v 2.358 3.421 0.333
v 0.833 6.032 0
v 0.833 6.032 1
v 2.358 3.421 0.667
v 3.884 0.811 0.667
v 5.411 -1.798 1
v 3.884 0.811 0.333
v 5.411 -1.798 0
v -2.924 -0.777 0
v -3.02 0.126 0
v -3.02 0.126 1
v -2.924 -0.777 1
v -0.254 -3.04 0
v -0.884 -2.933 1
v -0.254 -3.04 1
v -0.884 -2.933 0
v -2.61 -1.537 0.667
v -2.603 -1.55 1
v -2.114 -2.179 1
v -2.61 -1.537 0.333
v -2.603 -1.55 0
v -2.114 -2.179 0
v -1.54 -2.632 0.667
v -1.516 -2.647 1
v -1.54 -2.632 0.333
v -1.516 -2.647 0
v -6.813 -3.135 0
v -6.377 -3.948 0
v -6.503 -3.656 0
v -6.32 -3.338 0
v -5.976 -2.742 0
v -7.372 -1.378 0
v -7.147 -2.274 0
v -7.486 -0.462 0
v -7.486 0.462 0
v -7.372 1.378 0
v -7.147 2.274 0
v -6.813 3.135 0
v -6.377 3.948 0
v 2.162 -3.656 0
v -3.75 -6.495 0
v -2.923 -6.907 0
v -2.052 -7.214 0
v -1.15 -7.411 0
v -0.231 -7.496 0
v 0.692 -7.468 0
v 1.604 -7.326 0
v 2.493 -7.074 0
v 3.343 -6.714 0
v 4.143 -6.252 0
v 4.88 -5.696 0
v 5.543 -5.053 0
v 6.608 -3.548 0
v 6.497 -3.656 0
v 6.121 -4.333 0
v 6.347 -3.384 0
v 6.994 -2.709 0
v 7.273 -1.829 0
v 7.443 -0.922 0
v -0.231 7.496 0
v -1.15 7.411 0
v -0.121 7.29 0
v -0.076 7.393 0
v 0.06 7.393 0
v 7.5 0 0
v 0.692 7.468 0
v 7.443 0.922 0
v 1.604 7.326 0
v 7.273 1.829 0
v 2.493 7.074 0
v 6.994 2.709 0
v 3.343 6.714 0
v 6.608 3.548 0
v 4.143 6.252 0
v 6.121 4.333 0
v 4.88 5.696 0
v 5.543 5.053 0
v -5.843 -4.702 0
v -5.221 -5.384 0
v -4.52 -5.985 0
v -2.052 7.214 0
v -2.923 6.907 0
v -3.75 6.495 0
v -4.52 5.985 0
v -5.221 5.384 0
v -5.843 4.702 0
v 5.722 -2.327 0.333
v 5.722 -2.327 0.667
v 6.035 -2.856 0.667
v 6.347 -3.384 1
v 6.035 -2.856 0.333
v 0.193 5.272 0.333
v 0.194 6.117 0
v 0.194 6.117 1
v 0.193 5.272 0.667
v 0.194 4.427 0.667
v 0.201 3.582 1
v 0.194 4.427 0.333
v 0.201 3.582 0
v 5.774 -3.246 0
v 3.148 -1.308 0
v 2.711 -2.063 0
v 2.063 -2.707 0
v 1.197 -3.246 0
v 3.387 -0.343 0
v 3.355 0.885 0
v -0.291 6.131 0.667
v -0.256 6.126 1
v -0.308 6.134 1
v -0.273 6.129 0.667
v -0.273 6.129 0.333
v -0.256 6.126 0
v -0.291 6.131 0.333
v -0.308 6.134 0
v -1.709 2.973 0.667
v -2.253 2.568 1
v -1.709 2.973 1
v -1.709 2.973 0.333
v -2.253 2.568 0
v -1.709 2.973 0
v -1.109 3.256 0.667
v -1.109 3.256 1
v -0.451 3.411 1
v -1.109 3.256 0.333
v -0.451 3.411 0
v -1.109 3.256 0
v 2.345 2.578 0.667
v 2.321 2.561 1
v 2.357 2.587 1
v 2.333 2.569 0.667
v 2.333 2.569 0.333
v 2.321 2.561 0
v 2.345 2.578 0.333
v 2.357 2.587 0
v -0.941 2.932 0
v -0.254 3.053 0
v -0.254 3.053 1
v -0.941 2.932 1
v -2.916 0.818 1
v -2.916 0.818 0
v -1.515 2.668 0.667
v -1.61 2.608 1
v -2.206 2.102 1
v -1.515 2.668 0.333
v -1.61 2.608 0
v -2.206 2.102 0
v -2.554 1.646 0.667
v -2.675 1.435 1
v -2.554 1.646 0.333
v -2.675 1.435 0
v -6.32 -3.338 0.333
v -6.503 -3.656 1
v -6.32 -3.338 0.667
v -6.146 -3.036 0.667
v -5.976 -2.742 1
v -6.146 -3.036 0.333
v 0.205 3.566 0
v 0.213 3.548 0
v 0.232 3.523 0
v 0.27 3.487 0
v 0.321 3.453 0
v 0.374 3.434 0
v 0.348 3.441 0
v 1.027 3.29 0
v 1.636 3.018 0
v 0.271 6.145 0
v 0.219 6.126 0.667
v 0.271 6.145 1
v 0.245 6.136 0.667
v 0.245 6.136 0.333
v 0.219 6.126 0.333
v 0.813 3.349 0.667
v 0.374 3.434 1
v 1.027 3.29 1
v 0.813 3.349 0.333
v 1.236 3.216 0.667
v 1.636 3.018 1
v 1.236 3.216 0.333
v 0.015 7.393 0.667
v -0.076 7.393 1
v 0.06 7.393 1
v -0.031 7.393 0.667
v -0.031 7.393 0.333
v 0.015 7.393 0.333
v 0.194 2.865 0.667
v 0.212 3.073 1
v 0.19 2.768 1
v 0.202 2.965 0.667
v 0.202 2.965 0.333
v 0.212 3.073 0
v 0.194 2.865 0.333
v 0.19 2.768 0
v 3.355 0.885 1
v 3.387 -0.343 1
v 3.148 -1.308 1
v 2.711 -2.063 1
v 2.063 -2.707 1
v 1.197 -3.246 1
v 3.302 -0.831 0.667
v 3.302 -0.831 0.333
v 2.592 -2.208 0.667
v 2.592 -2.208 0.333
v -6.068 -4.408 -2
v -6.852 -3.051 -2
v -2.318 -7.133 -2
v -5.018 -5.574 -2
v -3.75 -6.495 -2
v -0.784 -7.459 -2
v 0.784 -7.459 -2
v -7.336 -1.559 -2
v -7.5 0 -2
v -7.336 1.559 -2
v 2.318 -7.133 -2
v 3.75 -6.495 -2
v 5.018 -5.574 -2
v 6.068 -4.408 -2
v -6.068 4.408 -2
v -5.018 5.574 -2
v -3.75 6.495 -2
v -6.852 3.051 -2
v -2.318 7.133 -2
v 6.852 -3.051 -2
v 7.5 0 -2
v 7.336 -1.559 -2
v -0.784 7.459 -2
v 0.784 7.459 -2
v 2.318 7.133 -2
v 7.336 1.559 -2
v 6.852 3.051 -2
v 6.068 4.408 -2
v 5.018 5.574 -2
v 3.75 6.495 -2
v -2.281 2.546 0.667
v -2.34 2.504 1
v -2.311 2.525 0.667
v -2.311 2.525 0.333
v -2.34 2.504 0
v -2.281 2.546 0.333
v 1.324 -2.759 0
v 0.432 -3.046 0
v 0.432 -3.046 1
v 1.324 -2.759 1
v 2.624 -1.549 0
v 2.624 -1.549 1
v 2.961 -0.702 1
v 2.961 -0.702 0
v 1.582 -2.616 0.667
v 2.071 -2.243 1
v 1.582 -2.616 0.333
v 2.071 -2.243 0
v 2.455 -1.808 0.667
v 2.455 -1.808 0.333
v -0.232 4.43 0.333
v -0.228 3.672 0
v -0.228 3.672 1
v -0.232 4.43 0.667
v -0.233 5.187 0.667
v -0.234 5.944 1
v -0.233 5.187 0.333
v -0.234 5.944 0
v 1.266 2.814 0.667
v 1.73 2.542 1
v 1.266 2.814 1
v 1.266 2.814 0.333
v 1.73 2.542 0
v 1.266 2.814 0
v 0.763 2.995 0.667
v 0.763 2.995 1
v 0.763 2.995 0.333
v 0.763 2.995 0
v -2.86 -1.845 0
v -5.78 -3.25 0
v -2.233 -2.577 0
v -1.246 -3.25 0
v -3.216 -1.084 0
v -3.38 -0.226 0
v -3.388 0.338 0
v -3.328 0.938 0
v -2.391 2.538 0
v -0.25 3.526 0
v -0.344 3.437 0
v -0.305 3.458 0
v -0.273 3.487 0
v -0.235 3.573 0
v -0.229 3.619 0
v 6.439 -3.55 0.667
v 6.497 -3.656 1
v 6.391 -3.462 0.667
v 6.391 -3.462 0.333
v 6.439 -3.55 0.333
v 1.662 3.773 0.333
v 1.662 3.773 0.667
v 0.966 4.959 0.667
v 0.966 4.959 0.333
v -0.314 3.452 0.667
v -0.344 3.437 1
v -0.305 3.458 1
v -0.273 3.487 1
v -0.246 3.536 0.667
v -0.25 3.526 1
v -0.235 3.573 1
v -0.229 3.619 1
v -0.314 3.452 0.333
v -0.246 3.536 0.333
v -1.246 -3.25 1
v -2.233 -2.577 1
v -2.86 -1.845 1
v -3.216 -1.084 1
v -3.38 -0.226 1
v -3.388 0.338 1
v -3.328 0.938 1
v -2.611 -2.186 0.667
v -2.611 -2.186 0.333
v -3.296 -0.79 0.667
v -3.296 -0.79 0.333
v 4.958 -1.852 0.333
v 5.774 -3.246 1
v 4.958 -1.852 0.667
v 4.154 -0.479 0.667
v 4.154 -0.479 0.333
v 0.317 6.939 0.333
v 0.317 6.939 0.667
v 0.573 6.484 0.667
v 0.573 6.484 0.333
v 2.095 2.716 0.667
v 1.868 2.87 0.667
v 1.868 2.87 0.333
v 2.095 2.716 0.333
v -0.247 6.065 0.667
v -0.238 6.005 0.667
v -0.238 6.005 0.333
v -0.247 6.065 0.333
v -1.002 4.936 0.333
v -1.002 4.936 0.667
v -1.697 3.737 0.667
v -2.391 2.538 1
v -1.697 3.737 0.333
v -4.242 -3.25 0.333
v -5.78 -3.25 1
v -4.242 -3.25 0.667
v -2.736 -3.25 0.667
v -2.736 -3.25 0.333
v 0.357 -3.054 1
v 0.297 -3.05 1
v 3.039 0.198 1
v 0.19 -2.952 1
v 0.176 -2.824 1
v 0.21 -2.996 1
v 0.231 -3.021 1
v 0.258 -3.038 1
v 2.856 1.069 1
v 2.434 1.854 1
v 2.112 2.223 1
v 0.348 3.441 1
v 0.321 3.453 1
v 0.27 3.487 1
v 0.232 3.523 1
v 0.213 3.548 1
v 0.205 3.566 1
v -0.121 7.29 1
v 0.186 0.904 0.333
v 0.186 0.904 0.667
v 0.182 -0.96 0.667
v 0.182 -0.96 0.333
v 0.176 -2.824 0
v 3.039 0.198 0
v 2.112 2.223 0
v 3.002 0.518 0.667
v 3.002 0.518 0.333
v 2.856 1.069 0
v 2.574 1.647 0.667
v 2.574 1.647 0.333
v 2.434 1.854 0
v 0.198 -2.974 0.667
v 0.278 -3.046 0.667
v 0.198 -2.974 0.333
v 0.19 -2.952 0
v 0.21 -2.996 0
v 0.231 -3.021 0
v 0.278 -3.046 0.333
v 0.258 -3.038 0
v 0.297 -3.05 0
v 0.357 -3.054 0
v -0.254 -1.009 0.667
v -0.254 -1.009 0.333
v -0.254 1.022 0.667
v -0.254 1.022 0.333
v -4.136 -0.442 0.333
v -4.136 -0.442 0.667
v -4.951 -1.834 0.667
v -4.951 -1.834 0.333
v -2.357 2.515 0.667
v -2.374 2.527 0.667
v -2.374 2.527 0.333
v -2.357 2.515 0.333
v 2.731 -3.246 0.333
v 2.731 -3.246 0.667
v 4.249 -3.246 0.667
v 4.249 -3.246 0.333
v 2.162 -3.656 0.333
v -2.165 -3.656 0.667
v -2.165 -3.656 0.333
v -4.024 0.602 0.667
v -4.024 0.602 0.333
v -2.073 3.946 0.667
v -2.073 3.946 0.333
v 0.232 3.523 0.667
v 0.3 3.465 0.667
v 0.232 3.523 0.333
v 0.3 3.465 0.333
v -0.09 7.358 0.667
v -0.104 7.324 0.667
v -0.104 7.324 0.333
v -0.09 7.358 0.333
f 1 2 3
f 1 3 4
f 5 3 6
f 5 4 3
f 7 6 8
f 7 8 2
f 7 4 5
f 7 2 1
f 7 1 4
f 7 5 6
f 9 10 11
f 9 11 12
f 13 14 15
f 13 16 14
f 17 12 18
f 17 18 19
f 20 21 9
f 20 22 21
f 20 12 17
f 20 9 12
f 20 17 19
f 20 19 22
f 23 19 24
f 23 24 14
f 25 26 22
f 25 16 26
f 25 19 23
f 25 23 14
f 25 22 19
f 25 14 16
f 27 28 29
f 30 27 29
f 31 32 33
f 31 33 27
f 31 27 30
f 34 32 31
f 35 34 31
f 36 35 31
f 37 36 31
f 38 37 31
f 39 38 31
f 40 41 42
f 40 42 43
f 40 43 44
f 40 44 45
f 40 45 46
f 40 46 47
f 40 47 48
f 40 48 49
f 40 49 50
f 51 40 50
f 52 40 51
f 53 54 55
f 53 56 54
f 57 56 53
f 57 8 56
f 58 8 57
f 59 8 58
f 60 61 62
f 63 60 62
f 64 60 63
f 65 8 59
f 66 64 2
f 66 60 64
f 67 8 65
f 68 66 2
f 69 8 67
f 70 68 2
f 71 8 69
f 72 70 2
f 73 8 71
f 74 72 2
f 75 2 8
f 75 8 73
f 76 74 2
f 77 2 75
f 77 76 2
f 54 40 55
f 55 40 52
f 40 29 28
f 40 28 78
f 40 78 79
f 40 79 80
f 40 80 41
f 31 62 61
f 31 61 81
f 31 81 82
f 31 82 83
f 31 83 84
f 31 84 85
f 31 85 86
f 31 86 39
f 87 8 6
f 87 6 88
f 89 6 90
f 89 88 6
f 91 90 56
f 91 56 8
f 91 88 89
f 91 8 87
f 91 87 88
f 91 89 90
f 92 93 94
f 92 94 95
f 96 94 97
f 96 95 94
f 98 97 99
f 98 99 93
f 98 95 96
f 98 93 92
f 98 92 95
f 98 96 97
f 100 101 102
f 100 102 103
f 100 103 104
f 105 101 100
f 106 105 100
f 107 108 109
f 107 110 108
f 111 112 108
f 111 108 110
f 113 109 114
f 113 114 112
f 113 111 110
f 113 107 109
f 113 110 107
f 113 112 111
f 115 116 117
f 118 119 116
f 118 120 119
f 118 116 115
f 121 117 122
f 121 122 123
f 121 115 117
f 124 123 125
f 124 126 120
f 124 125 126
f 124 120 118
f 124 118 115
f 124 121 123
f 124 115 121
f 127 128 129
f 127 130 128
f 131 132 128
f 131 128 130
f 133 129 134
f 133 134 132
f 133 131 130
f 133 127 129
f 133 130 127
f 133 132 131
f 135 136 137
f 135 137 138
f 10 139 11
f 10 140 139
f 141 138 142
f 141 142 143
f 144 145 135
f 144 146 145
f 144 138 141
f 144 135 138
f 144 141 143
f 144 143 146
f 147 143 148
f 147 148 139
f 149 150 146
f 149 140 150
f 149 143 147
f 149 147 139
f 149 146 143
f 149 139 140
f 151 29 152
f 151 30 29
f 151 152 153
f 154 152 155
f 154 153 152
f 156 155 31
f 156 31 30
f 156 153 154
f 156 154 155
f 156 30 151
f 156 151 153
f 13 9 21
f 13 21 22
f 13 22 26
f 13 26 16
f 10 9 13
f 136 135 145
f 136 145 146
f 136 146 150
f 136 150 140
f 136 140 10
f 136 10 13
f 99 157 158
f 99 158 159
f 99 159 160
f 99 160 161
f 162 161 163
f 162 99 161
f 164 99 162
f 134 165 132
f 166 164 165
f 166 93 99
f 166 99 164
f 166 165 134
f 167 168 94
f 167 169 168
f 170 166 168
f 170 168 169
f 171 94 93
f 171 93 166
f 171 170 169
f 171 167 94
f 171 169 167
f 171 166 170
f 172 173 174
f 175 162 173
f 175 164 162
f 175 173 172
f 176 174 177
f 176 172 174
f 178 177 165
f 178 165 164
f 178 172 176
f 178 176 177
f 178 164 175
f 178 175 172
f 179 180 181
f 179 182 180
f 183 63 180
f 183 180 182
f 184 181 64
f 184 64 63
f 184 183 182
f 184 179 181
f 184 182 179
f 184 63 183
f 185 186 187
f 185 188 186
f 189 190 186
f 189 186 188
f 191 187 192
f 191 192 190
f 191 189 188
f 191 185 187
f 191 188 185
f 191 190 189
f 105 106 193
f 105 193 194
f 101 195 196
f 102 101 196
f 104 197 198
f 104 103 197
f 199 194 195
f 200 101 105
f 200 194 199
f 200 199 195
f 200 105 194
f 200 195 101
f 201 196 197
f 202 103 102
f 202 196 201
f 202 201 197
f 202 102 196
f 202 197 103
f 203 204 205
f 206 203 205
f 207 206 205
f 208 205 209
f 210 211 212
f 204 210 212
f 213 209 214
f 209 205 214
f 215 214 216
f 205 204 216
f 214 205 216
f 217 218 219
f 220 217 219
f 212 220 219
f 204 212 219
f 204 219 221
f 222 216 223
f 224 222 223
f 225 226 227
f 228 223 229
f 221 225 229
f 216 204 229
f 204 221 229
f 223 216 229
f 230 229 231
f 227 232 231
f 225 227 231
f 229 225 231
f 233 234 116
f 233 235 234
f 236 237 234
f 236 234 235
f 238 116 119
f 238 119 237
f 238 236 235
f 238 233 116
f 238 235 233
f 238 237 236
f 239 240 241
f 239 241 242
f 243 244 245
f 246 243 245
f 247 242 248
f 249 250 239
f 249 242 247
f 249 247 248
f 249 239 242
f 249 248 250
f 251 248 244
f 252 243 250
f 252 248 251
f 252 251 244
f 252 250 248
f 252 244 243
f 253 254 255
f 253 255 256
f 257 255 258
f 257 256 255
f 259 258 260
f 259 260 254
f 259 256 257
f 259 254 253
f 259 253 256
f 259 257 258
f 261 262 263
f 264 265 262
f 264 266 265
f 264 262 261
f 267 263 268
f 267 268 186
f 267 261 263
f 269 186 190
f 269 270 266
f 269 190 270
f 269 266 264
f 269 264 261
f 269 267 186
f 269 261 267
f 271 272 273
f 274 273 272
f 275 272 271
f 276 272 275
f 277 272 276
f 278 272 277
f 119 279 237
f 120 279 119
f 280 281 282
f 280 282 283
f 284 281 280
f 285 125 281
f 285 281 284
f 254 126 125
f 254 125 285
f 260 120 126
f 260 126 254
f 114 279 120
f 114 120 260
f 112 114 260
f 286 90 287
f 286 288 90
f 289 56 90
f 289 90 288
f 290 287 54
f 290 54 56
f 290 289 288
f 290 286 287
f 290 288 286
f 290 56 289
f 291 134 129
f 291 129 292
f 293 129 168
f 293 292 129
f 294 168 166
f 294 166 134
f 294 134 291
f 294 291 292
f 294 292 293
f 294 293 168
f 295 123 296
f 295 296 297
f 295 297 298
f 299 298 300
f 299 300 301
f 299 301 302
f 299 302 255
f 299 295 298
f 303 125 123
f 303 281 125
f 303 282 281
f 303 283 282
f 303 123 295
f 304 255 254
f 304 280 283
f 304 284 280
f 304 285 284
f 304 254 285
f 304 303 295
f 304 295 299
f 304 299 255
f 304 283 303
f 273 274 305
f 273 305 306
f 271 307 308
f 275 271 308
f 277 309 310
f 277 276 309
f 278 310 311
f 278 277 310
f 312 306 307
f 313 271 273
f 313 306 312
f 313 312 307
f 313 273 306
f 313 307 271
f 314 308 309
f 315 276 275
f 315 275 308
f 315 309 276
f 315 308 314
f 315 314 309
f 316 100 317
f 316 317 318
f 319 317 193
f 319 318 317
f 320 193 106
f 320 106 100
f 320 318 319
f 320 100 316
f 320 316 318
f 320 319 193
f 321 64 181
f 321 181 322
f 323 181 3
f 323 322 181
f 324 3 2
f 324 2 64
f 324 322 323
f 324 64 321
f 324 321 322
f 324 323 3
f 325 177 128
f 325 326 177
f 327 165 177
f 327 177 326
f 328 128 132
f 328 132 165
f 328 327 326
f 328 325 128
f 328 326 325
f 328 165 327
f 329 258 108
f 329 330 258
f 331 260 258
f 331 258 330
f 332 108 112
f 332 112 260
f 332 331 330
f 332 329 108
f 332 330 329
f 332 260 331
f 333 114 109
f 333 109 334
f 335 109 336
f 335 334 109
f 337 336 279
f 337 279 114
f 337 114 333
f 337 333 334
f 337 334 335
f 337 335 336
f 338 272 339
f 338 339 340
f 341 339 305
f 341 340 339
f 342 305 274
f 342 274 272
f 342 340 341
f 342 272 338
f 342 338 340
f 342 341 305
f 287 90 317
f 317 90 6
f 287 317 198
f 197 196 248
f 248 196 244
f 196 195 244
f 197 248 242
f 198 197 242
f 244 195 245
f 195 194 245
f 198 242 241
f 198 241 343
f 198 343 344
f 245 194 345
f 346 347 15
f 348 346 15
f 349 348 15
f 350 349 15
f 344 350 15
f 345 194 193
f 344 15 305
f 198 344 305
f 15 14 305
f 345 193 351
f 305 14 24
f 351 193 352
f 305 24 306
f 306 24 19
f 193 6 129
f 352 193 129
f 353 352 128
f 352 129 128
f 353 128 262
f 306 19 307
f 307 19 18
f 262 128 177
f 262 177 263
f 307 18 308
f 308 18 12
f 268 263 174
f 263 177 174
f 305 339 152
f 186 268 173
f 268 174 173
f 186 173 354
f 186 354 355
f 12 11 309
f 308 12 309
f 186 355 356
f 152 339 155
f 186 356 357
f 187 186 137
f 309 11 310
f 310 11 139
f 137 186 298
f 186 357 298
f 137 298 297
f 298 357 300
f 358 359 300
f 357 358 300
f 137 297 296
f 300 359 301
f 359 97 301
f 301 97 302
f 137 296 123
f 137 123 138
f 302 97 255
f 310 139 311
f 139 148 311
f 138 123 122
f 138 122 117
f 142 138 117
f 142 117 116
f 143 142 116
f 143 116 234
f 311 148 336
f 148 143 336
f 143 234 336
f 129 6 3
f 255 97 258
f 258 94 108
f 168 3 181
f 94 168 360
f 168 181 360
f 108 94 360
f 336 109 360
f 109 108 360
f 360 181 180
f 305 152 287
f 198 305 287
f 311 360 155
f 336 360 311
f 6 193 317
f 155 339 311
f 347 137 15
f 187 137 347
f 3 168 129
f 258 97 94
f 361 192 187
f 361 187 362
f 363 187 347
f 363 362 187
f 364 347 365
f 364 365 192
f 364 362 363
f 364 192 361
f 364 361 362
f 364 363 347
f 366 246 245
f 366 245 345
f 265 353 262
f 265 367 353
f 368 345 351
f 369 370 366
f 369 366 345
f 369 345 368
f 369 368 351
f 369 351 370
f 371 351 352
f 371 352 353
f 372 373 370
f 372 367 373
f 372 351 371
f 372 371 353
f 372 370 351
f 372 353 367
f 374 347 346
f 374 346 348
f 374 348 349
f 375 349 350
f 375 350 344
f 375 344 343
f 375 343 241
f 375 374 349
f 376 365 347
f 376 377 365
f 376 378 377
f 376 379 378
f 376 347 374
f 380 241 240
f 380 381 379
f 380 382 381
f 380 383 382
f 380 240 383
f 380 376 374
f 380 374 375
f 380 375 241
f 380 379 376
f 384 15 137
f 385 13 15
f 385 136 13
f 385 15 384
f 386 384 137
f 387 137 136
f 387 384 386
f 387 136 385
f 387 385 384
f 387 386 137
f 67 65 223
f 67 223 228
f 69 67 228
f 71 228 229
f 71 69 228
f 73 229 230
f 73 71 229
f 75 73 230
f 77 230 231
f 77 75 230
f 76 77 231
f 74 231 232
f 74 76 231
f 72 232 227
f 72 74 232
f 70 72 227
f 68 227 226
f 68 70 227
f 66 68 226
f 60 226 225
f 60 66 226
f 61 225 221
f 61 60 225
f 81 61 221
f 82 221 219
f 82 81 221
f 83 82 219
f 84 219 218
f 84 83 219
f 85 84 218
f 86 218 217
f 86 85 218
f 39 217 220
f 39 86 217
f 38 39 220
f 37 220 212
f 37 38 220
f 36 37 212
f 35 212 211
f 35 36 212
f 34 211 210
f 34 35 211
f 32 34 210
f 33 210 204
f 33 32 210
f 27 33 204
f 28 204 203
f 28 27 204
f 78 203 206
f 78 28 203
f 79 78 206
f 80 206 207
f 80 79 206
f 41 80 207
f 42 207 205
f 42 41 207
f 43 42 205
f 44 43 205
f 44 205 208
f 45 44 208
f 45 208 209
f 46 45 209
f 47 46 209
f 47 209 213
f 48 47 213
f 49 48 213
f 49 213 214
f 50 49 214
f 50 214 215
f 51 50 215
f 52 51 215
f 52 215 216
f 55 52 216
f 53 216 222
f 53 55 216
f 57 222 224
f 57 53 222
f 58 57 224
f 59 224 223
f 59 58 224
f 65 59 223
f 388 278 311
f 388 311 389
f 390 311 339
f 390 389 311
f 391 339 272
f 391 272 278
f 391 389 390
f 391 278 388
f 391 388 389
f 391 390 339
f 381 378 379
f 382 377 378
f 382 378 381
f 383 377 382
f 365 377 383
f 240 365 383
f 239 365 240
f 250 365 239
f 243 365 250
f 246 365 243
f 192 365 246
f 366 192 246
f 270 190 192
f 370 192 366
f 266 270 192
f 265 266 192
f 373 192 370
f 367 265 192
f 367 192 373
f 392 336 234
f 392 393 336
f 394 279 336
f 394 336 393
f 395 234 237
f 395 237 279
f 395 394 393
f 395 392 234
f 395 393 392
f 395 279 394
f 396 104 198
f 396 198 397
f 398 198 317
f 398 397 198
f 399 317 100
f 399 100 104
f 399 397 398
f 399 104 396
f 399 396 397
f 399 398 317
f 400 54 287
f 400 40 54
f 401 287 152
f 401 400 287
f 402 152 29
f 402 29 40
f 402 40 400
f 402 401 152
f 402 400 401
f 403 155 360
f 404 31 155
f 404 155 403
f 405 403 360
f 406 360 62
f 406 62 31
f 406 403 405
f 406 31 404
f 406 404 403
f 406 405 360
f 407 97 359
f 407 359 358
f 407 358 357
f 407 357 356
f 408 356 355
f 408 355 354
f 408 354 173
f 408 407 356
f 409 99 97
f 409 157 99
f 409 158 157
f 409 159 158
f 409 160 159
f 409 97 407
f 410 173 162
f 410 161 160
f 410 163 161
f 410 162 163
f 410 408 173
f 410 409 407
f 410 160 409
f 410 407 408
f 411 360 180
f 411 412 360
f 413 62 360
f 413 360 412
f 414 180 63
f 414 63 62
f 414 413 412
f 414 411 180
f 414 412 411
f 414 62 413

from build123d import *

# Parameters (mm, degrees)
F0_R     = 7.5
F2_DEPTH = 2
F3_DEPTH = 1


with BuildPart() as f2:
    # F0 (on Top) → F2 (new body)
    with BuildSketch(Plane.XY):
        Circle(F0_R)
    extrude(amount=-F2_DEPTH)

    # F1 (on Top) → F3 (join)
    with BuildSketch(Plane.XY):
        with BuildLine():
            add(Edge.make_bspline(
                [(0.0604885835, 7.3933677407), (0.3177365835, 6.9391977407), (0.5701195835, 6.4822377407), (0.8330605835, 6.0315707407)],
                knots=[0, 0, 0, 0, 1, 1, 1, 1], degree=3))
            add(Edge.make_bspline(
                [(-0.0762024165, 7.3933677407), (-0.0304464165, 7.3933677407), (0.0150095835, 7.3933677407), (0.0604885835, 7.3933677407)],
                knots=[0, 0, 0, 0, 1, 1, 1, 1], degree=3))
            add(Edge.make_bspline(
                [(-0.1212204165, 7.2902617407), (-0.1024804165, 7.3224177407), (-0.0909554165, 7.3588837407), (-0.0762024165, 7.3933677407)],
                knots=[0, 0, 0, 0, 1, 1, 1, 1], degree=3))
            add(Edge.make_bspline(
                [(-5.9762144165, -2.7421532593), (-4.0245564165, 0.6020177407), (-2.0726114165, 3.9459087407), (-0.1212204165, 7.2902617407)],
                knots=[0, 0, 0, 0, 1, 1, 1, 1], degree=3))
            add(Edge.make_bspline(
                [(-6.5031424165, -3.6556322593), (-6.3136034165, -3.3269782593), (-6.1463944165, -3.0337092593), (-5.9762144165, -2.7421532593)],
                knots=[0, 0, 0, 0, 1, 1, 1, 1], degree=3))
            add(Edge.make_bspline(
                [(6.4969945835, -3.6556322593), (2.1508305835, -3.6556322593), (-2.1525754165, -3.6556322593), (-6.5031424165, -3.6556322593)],
                knots=[0, 0, 0, 0, 1, 1, 1, 1], degree=3))
            add(Edge.make_bspline(
                [(6.3467955835, -3.3839732593), (6.3915375835, -3.4597902593), (6.4323375835, -3.5381272593), (6.4969945835, -3.6556322593)],
                knots=[0, 0, 0, 0, 1, 1, 1, 1], degree=3))
            add(Edge.make_bspline(
                [(5.4107935835, -1.7983302593), (5.7208275835, -2.3279572593), (6.0352405835, -2.8551552593), (6.3467955835, -3.3839732593)],
                knots=[0, 0, 0, 0, 1, 1, 1, 1], degree=3))
            add(Edge.make_bspline(
                [(0.8330605835, 6.0315707407), (2.3574805835, 3.4207877407), (3.8841375835, 0.8110887407), (5.4107935835, -1.7983302593)],
                knots=[0, 0, 0, 0, 1, 1, 1, 1], degree=3))
        make_face()
        with BuildLine():
            add(Edge.make_bspline(
                [(-5.7796534165, -3.2501722593), (-4.2207504165, -3.2501722593), (-2.7330644165, -3.2501722593), (-1.2455714165, -3.2501722593)],
                knots=[0, 0, 0, 0, 1, 1, 1, 1], degree=3))
            add(Edge.make_bspline(
                [(-3.3280754165, 0.9378677407), (-4.1345774165, -0.4399492593), (-4.9410894165, -1.8178682593), (-5.7796534165, -3.2501722593)],
                knots=[0, 0, 0, 0, 1, 1, 1, 1], degree=3))
            add(Edge.make_bspline(
                [(-1.2455714165, -3.2501722593), (-2.9605984165, -2.3525382593), (-3.6127754165, -0.9545362593), (-3.3280754165, 0.9378677407)],
                knots=[0, 0, 0, 0, 1, 1, 1, 1], degree=3))
        make_face(mode=Mode.SUBTRACT)
        with BuildLine():
            add(Edge.make_bspline(
                [(-0.2542014165, 3.0525277407), (-1.5089494165, 3.0320817407), (-2.9568184165, 1.8495517407), (-3.0198624165, 0.1261557407)],
                knots=[0, 0, 0, 0, 1, 1, 1, 1], degree=3))
            add(Edge.make_bspline(
                [(-0.2542014165, -3.0399232593), (-0.2542014165, -1.0090972593), (-0.2542014165, 1.0216117407), (-0.2542014165, 3.0525277407)],
                knots=[0, 0, 0, 0, 1, 1, 1, 1], degree=3))
            add(Edge.make_bspline(
                [(-3.0198624165, 0.1261557407), (-3.0896374165, -1.7814012593), (-1.4984154165, -3.0158812593), (-0.2542014165, -3.0399232593)],
                knots=[0, 0, 0, 0, 1, 1, 1, 1], degree=3))
        make_face(mode=Mode.SUBTRACT)
        with BuildLine():
            add(Edge.make_bspline(
                [(3.3546825835, 0.8849197407), (3.6216575835, -1.0009142593), (2.9443555835, -2.3765812593), (1.1968255835, -3.2457582593)],
                knots=[0, 0, 0, 0, 1, 1, 1, 1], degree=3))
            add(Edge.make_bspline(
                [(5.7743975835, -3.2457582593), (4.9505145835, -1.8388482593), (4.1524725835, -0.4769692593), (3.3546825835, 0.8849197407)],
                knots=[0, 0, 0, 0, 1, 1, 1, 1], degree=3))
            add(Edge.make_bspline(
                [(1.1968255835, -3.2457582593), (2.7469015835, -3.2457582593), (4.2381755835, -3.2457582593), (5.7743975835, -3.2457582593)],
                knots=[0, 0, 0, 0, 1, 1, 1, 1], degree=3))
        make_face(mode=Mode.SUBTRACT)
        with BuildLine():
            add(Edge.make_bspline(
                [(0.2117715835, 3.0732277407), (0.2032195835, 2.9602327407), (0.1901495835, 2.8641567407), (0.1898735835, 2.7679887407)],
                knots=[0, 0, 0, 0, 1, 1, 1, 1], degree=3))
            add(Edge.make_bspline(
                [(1.7295995835, 2.5419747407), (1.2838885835, 2.8565037407), (0.7887565835, 3.0489087407), (0.2117715835, 3.0732277407)],
                knots=[0, 0, 0, 0, 1, 1, 1, 1], degree=3))
            add(Edge.make_bspline(
                [(2.9614815835, -0.7022442593), (3.2517605835, 0.5176517407), (2.7668865835, 1.8099267407), (1.7295995835, 2.5419747407)],
                knots=[0, 0, 0, 0, 1, 1, 1, 1], degree=3))
            add(Edge.make_bspline(
                [(0.4320915835, -3.0458662593), (1.6893525835, -2.8326462593), (2.6694735835, -1.9292522593), (2.9614815835, -0.7022442593)],
                knots=[0, 0, 0, 0, 1, 1, 1, 1], degree=3))
            add(Edge.make_bspline(
                [(0.1763655835, -2.8243612593), (0.1757435835, -3.0158812593), (0.2339925835, -3.0793612593), (0.4320915835, -3.0458662593)],
                knots=[0, 0, 0, 0, 1, 1, 1, 1], degree=3))
            add(Edge.make_bspline(
                [(0.1898735835, 2.7679887407), (0.1853785835, 0.9039367407), (0.1838565835, -0.9602062593), (0.1763655835, -2.8243612593)],
                knots=[0, 0, 0, 0, 1, 1, 1, 1], degree=3))
        make_face(mode=Mode.SUBTRACT)
        with BuildLine():
            add(Edge.make_bspline(
                [(-2.3909204165, 2.5383797407), (-2.3739784165, 2.5269457407), (-2.3571514165, 2.5151437407), (-2.3404854165, 2.5037107407)],
                knots=[0, 0, 0, 0, 1, 1, 1, 1], degree=3))
            add(Edge.make_bspline(
                [(-0.3082324165, 6.1343087407), (-1.0024544165, 4.9357577407), (-1.6968604165, 3.7371147407), (-2.3909204165, 2.5383797407)],
                knots=[0, 0, 0, 0, 1, 1, 1, 1], degree=3))
            add(Edge.make_bspline(
                [(-0.2558374165, 6.1257567407), (-0.2732874165, 6.1285457407), (-0.2908514165, 6.1315197407), (-0.3082324165, 6.1343087407)],
                knots=[0, 0, 0, 0, 1, 1, 1, 1], degree=3))
            add(Edge.make_bspline(
                [(-0.2339394165, 5.9442317407), (-0.2341234165, 6.0047397407), (-0.2481844165, 6.0652487407), (-0.2558374165, 6.1257567407)],
                knots=[0, 0, 0, 0, 1, 1, 1, 1], degree=3))
            add(Edge.make_bspline(
                [(-0.2276464165, 3.6721807407), (-0.2339394165, 4.4295387407), (-0.2315194165, 5.1869657407), (-0.2339394165, 5.9442317407)],
                knots=[0, 0, 0, 0, 1, 1, 1, 1], degree=3))
            add(Edge.make_bspline(
                [(-0.4507784165, 3.4107147407), (-0.2747394165, 3.4329587407), (-0.2261024165, 3.5076897407), (-0.2276464165, 3.6721807407)],
                knots=[0, 0, 0, 0, 1, 1, 1, 1], degree=3))
            add(Edge.make_bspline(
                [(-2.2525234165, 2.5683687407), (-1.7367614165, 3.0309067407), (-1.1393294165, 3.3233747407), (-0.4507784165, 3.4107147407)],
                knots=[0, 0, 0, 0, 1, 1, 1, 1], degree=3))
            add(Edge.make_bspline(
                [(-2.3404854165, 2.5037107407), (-2.3110494165, 2.5251477407), (-2.2792624165, 2.5439577407), (-2.2525234165, 2.5683687407)],
                knots=[0, 0, 0, 0, 1, 1, 1, 1], degree=3))
        make_face(mode=Mode.SUBTRACT)
        with BuildLine():
            add(Edge.make_bspline(
                [(2.3211755835, 2.5607157407), (2.3334385835, 2.5692677407), (2.3453105835, 2.5780037407), (2.3572965835, 2.5865557407)],
                knots=[0, 0, 0, 0, 1, 1, 1, 1], degree=3))
            add(Edge.make_bspline(
                [(1.6364045835, 3.0178597407), (1.8710625835, 2.8758667407), (2.0933875835, 2.7136807407), (2.3211755835, 2.5607157407)],
                knots=[0, 0, 0, 0, 1, 1, 1, 1], degree=3))
            add(Edge.make_bspline(
                [(0.3738415835, 3.4342957407), (0.8199905835, 3.3685777407), (1.2488745835, 3.2528627407), (1.6364045835, 3.0178597407)],
                knots=[0, 0, 0, 0, 1, 1, 1, 1], degree=3))
            add(Edge.make_bspline(
                [(0.2013985835, 3.5821437407), (0.2018595835, 3.5301877407), (0.3079165835, 3.4442077407), (0.3738415835, 3.4342957407)],
                knots=[0, 0, 0, 0, 1, 1, 1, 1], degree=3))
            add(Edge.make_bspline(
                [(0.1935845835, 6.1167437407), (0.1935845835, 5.2718847407), (0.1904265835, 4.4270257407), (0.2013985835, 3.5821437407)],
                knots=[0, 0, 0, 0, 1, 1, 1, 1], degree=3))
            add(Edge.make_bspline(
                [(0.2710125835, 6.1454647407), (0.2450795835, 6.1359217407), (0.2194245835, 6.1263787407), (0.1935845835, 6.1167437407)],
                knots=[0, 0, 0, 0, 1, 1, 1, 1], degree=3))
            add(Edge.make_bspline(
                [(2.3572965835, 2.5865557407), (1.6618995835, 3.7728667407), (0.9663175835, 4.9591547407), (0.2710125835, 6.1454647407)],
                knots=[0, 0, 0, 0, 1, 1, 1, 1], degree=3))
        make_face(mode=Mode.SUBTRACT)
    extrude(amount=F3_DEPTH)


solid = f2.part
